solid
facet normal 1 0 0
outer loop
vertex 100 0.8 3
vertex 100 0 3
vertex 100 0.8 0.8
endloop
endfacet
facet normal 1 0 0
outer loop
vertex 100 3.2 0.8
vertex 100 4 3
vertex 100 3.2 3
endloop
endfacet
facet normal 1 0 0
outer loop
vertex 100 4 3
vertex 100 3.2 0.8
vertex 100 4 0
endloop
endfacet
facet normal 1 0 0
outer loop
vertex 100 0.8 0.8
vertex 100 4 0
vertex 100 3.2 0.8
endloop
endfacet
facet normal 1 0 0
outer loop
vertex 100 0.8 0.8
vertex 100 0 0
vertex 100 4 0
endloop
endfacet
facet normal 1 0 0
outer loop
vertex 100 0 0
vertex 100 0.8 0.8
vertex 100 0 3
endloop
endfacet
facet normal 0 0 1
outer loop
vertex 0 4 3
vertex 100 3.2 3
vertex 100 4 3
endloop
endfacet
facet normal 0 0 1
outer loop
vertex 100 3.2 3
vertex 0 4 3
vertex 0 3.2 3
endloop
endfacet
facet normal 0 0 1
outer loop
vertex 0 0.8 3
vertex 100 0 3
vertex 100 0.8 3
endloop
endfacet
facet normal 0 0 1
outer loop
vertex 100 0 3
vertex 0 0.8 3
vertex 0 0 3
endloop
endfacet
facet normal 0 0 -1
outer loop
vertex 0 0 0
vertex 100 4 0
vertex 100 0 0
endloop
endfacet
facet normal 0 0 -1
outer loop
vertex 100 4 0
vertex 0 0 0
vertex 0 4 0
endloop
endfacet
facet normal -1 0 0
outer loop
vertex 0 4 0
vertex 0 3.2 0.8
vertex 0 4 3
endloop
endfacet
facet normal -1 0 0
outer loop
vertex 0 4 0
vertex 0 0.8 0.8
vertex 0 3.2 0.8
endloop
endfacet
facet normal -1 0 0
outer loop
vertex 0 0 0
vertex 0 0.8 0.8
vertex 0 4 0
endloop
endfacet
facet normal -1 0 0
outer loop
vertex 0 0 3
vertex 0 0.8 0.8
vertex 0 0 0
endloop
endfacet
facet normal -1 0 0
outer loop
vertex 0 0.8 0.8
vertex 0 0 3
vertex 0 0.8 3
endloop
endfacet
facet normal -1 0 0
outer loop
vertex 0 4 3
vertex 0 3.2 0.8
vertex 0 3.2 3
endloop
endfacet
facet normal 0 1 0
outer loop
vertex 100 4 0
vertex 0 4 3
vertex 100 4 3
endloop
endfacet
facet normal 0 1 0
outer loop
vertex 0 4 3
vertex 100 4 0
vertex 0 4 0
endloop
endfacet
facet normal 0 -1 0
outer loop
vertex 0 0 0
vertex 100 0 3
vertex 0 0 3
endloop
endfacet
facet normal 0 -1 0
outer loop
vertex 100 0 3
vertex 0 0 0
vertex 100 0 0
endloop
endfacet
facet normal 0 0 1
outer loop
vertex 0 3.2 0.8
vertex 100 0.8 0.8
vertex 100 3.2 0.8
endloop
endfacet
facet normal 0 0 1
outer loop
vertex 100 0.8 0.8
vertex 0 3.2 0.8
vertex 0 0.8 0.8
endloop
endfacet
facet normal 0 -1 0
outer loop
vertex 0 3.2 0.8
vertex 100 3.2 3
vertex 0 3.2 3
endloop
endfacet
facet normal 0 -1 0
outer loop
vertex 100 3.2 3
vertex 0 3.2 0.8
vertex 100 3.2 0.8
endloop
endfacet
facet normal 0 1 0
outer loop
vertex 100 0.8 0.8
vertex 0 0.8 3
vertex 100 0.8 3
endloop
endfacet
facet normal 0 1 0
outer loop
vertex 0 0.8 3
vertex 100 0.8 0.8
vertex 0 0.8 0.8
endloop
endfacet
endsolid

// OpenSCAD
difference() {
cube([100,4,3]);
translate([0,0.8,0.8]) cube([100,2.4,3]);
}
